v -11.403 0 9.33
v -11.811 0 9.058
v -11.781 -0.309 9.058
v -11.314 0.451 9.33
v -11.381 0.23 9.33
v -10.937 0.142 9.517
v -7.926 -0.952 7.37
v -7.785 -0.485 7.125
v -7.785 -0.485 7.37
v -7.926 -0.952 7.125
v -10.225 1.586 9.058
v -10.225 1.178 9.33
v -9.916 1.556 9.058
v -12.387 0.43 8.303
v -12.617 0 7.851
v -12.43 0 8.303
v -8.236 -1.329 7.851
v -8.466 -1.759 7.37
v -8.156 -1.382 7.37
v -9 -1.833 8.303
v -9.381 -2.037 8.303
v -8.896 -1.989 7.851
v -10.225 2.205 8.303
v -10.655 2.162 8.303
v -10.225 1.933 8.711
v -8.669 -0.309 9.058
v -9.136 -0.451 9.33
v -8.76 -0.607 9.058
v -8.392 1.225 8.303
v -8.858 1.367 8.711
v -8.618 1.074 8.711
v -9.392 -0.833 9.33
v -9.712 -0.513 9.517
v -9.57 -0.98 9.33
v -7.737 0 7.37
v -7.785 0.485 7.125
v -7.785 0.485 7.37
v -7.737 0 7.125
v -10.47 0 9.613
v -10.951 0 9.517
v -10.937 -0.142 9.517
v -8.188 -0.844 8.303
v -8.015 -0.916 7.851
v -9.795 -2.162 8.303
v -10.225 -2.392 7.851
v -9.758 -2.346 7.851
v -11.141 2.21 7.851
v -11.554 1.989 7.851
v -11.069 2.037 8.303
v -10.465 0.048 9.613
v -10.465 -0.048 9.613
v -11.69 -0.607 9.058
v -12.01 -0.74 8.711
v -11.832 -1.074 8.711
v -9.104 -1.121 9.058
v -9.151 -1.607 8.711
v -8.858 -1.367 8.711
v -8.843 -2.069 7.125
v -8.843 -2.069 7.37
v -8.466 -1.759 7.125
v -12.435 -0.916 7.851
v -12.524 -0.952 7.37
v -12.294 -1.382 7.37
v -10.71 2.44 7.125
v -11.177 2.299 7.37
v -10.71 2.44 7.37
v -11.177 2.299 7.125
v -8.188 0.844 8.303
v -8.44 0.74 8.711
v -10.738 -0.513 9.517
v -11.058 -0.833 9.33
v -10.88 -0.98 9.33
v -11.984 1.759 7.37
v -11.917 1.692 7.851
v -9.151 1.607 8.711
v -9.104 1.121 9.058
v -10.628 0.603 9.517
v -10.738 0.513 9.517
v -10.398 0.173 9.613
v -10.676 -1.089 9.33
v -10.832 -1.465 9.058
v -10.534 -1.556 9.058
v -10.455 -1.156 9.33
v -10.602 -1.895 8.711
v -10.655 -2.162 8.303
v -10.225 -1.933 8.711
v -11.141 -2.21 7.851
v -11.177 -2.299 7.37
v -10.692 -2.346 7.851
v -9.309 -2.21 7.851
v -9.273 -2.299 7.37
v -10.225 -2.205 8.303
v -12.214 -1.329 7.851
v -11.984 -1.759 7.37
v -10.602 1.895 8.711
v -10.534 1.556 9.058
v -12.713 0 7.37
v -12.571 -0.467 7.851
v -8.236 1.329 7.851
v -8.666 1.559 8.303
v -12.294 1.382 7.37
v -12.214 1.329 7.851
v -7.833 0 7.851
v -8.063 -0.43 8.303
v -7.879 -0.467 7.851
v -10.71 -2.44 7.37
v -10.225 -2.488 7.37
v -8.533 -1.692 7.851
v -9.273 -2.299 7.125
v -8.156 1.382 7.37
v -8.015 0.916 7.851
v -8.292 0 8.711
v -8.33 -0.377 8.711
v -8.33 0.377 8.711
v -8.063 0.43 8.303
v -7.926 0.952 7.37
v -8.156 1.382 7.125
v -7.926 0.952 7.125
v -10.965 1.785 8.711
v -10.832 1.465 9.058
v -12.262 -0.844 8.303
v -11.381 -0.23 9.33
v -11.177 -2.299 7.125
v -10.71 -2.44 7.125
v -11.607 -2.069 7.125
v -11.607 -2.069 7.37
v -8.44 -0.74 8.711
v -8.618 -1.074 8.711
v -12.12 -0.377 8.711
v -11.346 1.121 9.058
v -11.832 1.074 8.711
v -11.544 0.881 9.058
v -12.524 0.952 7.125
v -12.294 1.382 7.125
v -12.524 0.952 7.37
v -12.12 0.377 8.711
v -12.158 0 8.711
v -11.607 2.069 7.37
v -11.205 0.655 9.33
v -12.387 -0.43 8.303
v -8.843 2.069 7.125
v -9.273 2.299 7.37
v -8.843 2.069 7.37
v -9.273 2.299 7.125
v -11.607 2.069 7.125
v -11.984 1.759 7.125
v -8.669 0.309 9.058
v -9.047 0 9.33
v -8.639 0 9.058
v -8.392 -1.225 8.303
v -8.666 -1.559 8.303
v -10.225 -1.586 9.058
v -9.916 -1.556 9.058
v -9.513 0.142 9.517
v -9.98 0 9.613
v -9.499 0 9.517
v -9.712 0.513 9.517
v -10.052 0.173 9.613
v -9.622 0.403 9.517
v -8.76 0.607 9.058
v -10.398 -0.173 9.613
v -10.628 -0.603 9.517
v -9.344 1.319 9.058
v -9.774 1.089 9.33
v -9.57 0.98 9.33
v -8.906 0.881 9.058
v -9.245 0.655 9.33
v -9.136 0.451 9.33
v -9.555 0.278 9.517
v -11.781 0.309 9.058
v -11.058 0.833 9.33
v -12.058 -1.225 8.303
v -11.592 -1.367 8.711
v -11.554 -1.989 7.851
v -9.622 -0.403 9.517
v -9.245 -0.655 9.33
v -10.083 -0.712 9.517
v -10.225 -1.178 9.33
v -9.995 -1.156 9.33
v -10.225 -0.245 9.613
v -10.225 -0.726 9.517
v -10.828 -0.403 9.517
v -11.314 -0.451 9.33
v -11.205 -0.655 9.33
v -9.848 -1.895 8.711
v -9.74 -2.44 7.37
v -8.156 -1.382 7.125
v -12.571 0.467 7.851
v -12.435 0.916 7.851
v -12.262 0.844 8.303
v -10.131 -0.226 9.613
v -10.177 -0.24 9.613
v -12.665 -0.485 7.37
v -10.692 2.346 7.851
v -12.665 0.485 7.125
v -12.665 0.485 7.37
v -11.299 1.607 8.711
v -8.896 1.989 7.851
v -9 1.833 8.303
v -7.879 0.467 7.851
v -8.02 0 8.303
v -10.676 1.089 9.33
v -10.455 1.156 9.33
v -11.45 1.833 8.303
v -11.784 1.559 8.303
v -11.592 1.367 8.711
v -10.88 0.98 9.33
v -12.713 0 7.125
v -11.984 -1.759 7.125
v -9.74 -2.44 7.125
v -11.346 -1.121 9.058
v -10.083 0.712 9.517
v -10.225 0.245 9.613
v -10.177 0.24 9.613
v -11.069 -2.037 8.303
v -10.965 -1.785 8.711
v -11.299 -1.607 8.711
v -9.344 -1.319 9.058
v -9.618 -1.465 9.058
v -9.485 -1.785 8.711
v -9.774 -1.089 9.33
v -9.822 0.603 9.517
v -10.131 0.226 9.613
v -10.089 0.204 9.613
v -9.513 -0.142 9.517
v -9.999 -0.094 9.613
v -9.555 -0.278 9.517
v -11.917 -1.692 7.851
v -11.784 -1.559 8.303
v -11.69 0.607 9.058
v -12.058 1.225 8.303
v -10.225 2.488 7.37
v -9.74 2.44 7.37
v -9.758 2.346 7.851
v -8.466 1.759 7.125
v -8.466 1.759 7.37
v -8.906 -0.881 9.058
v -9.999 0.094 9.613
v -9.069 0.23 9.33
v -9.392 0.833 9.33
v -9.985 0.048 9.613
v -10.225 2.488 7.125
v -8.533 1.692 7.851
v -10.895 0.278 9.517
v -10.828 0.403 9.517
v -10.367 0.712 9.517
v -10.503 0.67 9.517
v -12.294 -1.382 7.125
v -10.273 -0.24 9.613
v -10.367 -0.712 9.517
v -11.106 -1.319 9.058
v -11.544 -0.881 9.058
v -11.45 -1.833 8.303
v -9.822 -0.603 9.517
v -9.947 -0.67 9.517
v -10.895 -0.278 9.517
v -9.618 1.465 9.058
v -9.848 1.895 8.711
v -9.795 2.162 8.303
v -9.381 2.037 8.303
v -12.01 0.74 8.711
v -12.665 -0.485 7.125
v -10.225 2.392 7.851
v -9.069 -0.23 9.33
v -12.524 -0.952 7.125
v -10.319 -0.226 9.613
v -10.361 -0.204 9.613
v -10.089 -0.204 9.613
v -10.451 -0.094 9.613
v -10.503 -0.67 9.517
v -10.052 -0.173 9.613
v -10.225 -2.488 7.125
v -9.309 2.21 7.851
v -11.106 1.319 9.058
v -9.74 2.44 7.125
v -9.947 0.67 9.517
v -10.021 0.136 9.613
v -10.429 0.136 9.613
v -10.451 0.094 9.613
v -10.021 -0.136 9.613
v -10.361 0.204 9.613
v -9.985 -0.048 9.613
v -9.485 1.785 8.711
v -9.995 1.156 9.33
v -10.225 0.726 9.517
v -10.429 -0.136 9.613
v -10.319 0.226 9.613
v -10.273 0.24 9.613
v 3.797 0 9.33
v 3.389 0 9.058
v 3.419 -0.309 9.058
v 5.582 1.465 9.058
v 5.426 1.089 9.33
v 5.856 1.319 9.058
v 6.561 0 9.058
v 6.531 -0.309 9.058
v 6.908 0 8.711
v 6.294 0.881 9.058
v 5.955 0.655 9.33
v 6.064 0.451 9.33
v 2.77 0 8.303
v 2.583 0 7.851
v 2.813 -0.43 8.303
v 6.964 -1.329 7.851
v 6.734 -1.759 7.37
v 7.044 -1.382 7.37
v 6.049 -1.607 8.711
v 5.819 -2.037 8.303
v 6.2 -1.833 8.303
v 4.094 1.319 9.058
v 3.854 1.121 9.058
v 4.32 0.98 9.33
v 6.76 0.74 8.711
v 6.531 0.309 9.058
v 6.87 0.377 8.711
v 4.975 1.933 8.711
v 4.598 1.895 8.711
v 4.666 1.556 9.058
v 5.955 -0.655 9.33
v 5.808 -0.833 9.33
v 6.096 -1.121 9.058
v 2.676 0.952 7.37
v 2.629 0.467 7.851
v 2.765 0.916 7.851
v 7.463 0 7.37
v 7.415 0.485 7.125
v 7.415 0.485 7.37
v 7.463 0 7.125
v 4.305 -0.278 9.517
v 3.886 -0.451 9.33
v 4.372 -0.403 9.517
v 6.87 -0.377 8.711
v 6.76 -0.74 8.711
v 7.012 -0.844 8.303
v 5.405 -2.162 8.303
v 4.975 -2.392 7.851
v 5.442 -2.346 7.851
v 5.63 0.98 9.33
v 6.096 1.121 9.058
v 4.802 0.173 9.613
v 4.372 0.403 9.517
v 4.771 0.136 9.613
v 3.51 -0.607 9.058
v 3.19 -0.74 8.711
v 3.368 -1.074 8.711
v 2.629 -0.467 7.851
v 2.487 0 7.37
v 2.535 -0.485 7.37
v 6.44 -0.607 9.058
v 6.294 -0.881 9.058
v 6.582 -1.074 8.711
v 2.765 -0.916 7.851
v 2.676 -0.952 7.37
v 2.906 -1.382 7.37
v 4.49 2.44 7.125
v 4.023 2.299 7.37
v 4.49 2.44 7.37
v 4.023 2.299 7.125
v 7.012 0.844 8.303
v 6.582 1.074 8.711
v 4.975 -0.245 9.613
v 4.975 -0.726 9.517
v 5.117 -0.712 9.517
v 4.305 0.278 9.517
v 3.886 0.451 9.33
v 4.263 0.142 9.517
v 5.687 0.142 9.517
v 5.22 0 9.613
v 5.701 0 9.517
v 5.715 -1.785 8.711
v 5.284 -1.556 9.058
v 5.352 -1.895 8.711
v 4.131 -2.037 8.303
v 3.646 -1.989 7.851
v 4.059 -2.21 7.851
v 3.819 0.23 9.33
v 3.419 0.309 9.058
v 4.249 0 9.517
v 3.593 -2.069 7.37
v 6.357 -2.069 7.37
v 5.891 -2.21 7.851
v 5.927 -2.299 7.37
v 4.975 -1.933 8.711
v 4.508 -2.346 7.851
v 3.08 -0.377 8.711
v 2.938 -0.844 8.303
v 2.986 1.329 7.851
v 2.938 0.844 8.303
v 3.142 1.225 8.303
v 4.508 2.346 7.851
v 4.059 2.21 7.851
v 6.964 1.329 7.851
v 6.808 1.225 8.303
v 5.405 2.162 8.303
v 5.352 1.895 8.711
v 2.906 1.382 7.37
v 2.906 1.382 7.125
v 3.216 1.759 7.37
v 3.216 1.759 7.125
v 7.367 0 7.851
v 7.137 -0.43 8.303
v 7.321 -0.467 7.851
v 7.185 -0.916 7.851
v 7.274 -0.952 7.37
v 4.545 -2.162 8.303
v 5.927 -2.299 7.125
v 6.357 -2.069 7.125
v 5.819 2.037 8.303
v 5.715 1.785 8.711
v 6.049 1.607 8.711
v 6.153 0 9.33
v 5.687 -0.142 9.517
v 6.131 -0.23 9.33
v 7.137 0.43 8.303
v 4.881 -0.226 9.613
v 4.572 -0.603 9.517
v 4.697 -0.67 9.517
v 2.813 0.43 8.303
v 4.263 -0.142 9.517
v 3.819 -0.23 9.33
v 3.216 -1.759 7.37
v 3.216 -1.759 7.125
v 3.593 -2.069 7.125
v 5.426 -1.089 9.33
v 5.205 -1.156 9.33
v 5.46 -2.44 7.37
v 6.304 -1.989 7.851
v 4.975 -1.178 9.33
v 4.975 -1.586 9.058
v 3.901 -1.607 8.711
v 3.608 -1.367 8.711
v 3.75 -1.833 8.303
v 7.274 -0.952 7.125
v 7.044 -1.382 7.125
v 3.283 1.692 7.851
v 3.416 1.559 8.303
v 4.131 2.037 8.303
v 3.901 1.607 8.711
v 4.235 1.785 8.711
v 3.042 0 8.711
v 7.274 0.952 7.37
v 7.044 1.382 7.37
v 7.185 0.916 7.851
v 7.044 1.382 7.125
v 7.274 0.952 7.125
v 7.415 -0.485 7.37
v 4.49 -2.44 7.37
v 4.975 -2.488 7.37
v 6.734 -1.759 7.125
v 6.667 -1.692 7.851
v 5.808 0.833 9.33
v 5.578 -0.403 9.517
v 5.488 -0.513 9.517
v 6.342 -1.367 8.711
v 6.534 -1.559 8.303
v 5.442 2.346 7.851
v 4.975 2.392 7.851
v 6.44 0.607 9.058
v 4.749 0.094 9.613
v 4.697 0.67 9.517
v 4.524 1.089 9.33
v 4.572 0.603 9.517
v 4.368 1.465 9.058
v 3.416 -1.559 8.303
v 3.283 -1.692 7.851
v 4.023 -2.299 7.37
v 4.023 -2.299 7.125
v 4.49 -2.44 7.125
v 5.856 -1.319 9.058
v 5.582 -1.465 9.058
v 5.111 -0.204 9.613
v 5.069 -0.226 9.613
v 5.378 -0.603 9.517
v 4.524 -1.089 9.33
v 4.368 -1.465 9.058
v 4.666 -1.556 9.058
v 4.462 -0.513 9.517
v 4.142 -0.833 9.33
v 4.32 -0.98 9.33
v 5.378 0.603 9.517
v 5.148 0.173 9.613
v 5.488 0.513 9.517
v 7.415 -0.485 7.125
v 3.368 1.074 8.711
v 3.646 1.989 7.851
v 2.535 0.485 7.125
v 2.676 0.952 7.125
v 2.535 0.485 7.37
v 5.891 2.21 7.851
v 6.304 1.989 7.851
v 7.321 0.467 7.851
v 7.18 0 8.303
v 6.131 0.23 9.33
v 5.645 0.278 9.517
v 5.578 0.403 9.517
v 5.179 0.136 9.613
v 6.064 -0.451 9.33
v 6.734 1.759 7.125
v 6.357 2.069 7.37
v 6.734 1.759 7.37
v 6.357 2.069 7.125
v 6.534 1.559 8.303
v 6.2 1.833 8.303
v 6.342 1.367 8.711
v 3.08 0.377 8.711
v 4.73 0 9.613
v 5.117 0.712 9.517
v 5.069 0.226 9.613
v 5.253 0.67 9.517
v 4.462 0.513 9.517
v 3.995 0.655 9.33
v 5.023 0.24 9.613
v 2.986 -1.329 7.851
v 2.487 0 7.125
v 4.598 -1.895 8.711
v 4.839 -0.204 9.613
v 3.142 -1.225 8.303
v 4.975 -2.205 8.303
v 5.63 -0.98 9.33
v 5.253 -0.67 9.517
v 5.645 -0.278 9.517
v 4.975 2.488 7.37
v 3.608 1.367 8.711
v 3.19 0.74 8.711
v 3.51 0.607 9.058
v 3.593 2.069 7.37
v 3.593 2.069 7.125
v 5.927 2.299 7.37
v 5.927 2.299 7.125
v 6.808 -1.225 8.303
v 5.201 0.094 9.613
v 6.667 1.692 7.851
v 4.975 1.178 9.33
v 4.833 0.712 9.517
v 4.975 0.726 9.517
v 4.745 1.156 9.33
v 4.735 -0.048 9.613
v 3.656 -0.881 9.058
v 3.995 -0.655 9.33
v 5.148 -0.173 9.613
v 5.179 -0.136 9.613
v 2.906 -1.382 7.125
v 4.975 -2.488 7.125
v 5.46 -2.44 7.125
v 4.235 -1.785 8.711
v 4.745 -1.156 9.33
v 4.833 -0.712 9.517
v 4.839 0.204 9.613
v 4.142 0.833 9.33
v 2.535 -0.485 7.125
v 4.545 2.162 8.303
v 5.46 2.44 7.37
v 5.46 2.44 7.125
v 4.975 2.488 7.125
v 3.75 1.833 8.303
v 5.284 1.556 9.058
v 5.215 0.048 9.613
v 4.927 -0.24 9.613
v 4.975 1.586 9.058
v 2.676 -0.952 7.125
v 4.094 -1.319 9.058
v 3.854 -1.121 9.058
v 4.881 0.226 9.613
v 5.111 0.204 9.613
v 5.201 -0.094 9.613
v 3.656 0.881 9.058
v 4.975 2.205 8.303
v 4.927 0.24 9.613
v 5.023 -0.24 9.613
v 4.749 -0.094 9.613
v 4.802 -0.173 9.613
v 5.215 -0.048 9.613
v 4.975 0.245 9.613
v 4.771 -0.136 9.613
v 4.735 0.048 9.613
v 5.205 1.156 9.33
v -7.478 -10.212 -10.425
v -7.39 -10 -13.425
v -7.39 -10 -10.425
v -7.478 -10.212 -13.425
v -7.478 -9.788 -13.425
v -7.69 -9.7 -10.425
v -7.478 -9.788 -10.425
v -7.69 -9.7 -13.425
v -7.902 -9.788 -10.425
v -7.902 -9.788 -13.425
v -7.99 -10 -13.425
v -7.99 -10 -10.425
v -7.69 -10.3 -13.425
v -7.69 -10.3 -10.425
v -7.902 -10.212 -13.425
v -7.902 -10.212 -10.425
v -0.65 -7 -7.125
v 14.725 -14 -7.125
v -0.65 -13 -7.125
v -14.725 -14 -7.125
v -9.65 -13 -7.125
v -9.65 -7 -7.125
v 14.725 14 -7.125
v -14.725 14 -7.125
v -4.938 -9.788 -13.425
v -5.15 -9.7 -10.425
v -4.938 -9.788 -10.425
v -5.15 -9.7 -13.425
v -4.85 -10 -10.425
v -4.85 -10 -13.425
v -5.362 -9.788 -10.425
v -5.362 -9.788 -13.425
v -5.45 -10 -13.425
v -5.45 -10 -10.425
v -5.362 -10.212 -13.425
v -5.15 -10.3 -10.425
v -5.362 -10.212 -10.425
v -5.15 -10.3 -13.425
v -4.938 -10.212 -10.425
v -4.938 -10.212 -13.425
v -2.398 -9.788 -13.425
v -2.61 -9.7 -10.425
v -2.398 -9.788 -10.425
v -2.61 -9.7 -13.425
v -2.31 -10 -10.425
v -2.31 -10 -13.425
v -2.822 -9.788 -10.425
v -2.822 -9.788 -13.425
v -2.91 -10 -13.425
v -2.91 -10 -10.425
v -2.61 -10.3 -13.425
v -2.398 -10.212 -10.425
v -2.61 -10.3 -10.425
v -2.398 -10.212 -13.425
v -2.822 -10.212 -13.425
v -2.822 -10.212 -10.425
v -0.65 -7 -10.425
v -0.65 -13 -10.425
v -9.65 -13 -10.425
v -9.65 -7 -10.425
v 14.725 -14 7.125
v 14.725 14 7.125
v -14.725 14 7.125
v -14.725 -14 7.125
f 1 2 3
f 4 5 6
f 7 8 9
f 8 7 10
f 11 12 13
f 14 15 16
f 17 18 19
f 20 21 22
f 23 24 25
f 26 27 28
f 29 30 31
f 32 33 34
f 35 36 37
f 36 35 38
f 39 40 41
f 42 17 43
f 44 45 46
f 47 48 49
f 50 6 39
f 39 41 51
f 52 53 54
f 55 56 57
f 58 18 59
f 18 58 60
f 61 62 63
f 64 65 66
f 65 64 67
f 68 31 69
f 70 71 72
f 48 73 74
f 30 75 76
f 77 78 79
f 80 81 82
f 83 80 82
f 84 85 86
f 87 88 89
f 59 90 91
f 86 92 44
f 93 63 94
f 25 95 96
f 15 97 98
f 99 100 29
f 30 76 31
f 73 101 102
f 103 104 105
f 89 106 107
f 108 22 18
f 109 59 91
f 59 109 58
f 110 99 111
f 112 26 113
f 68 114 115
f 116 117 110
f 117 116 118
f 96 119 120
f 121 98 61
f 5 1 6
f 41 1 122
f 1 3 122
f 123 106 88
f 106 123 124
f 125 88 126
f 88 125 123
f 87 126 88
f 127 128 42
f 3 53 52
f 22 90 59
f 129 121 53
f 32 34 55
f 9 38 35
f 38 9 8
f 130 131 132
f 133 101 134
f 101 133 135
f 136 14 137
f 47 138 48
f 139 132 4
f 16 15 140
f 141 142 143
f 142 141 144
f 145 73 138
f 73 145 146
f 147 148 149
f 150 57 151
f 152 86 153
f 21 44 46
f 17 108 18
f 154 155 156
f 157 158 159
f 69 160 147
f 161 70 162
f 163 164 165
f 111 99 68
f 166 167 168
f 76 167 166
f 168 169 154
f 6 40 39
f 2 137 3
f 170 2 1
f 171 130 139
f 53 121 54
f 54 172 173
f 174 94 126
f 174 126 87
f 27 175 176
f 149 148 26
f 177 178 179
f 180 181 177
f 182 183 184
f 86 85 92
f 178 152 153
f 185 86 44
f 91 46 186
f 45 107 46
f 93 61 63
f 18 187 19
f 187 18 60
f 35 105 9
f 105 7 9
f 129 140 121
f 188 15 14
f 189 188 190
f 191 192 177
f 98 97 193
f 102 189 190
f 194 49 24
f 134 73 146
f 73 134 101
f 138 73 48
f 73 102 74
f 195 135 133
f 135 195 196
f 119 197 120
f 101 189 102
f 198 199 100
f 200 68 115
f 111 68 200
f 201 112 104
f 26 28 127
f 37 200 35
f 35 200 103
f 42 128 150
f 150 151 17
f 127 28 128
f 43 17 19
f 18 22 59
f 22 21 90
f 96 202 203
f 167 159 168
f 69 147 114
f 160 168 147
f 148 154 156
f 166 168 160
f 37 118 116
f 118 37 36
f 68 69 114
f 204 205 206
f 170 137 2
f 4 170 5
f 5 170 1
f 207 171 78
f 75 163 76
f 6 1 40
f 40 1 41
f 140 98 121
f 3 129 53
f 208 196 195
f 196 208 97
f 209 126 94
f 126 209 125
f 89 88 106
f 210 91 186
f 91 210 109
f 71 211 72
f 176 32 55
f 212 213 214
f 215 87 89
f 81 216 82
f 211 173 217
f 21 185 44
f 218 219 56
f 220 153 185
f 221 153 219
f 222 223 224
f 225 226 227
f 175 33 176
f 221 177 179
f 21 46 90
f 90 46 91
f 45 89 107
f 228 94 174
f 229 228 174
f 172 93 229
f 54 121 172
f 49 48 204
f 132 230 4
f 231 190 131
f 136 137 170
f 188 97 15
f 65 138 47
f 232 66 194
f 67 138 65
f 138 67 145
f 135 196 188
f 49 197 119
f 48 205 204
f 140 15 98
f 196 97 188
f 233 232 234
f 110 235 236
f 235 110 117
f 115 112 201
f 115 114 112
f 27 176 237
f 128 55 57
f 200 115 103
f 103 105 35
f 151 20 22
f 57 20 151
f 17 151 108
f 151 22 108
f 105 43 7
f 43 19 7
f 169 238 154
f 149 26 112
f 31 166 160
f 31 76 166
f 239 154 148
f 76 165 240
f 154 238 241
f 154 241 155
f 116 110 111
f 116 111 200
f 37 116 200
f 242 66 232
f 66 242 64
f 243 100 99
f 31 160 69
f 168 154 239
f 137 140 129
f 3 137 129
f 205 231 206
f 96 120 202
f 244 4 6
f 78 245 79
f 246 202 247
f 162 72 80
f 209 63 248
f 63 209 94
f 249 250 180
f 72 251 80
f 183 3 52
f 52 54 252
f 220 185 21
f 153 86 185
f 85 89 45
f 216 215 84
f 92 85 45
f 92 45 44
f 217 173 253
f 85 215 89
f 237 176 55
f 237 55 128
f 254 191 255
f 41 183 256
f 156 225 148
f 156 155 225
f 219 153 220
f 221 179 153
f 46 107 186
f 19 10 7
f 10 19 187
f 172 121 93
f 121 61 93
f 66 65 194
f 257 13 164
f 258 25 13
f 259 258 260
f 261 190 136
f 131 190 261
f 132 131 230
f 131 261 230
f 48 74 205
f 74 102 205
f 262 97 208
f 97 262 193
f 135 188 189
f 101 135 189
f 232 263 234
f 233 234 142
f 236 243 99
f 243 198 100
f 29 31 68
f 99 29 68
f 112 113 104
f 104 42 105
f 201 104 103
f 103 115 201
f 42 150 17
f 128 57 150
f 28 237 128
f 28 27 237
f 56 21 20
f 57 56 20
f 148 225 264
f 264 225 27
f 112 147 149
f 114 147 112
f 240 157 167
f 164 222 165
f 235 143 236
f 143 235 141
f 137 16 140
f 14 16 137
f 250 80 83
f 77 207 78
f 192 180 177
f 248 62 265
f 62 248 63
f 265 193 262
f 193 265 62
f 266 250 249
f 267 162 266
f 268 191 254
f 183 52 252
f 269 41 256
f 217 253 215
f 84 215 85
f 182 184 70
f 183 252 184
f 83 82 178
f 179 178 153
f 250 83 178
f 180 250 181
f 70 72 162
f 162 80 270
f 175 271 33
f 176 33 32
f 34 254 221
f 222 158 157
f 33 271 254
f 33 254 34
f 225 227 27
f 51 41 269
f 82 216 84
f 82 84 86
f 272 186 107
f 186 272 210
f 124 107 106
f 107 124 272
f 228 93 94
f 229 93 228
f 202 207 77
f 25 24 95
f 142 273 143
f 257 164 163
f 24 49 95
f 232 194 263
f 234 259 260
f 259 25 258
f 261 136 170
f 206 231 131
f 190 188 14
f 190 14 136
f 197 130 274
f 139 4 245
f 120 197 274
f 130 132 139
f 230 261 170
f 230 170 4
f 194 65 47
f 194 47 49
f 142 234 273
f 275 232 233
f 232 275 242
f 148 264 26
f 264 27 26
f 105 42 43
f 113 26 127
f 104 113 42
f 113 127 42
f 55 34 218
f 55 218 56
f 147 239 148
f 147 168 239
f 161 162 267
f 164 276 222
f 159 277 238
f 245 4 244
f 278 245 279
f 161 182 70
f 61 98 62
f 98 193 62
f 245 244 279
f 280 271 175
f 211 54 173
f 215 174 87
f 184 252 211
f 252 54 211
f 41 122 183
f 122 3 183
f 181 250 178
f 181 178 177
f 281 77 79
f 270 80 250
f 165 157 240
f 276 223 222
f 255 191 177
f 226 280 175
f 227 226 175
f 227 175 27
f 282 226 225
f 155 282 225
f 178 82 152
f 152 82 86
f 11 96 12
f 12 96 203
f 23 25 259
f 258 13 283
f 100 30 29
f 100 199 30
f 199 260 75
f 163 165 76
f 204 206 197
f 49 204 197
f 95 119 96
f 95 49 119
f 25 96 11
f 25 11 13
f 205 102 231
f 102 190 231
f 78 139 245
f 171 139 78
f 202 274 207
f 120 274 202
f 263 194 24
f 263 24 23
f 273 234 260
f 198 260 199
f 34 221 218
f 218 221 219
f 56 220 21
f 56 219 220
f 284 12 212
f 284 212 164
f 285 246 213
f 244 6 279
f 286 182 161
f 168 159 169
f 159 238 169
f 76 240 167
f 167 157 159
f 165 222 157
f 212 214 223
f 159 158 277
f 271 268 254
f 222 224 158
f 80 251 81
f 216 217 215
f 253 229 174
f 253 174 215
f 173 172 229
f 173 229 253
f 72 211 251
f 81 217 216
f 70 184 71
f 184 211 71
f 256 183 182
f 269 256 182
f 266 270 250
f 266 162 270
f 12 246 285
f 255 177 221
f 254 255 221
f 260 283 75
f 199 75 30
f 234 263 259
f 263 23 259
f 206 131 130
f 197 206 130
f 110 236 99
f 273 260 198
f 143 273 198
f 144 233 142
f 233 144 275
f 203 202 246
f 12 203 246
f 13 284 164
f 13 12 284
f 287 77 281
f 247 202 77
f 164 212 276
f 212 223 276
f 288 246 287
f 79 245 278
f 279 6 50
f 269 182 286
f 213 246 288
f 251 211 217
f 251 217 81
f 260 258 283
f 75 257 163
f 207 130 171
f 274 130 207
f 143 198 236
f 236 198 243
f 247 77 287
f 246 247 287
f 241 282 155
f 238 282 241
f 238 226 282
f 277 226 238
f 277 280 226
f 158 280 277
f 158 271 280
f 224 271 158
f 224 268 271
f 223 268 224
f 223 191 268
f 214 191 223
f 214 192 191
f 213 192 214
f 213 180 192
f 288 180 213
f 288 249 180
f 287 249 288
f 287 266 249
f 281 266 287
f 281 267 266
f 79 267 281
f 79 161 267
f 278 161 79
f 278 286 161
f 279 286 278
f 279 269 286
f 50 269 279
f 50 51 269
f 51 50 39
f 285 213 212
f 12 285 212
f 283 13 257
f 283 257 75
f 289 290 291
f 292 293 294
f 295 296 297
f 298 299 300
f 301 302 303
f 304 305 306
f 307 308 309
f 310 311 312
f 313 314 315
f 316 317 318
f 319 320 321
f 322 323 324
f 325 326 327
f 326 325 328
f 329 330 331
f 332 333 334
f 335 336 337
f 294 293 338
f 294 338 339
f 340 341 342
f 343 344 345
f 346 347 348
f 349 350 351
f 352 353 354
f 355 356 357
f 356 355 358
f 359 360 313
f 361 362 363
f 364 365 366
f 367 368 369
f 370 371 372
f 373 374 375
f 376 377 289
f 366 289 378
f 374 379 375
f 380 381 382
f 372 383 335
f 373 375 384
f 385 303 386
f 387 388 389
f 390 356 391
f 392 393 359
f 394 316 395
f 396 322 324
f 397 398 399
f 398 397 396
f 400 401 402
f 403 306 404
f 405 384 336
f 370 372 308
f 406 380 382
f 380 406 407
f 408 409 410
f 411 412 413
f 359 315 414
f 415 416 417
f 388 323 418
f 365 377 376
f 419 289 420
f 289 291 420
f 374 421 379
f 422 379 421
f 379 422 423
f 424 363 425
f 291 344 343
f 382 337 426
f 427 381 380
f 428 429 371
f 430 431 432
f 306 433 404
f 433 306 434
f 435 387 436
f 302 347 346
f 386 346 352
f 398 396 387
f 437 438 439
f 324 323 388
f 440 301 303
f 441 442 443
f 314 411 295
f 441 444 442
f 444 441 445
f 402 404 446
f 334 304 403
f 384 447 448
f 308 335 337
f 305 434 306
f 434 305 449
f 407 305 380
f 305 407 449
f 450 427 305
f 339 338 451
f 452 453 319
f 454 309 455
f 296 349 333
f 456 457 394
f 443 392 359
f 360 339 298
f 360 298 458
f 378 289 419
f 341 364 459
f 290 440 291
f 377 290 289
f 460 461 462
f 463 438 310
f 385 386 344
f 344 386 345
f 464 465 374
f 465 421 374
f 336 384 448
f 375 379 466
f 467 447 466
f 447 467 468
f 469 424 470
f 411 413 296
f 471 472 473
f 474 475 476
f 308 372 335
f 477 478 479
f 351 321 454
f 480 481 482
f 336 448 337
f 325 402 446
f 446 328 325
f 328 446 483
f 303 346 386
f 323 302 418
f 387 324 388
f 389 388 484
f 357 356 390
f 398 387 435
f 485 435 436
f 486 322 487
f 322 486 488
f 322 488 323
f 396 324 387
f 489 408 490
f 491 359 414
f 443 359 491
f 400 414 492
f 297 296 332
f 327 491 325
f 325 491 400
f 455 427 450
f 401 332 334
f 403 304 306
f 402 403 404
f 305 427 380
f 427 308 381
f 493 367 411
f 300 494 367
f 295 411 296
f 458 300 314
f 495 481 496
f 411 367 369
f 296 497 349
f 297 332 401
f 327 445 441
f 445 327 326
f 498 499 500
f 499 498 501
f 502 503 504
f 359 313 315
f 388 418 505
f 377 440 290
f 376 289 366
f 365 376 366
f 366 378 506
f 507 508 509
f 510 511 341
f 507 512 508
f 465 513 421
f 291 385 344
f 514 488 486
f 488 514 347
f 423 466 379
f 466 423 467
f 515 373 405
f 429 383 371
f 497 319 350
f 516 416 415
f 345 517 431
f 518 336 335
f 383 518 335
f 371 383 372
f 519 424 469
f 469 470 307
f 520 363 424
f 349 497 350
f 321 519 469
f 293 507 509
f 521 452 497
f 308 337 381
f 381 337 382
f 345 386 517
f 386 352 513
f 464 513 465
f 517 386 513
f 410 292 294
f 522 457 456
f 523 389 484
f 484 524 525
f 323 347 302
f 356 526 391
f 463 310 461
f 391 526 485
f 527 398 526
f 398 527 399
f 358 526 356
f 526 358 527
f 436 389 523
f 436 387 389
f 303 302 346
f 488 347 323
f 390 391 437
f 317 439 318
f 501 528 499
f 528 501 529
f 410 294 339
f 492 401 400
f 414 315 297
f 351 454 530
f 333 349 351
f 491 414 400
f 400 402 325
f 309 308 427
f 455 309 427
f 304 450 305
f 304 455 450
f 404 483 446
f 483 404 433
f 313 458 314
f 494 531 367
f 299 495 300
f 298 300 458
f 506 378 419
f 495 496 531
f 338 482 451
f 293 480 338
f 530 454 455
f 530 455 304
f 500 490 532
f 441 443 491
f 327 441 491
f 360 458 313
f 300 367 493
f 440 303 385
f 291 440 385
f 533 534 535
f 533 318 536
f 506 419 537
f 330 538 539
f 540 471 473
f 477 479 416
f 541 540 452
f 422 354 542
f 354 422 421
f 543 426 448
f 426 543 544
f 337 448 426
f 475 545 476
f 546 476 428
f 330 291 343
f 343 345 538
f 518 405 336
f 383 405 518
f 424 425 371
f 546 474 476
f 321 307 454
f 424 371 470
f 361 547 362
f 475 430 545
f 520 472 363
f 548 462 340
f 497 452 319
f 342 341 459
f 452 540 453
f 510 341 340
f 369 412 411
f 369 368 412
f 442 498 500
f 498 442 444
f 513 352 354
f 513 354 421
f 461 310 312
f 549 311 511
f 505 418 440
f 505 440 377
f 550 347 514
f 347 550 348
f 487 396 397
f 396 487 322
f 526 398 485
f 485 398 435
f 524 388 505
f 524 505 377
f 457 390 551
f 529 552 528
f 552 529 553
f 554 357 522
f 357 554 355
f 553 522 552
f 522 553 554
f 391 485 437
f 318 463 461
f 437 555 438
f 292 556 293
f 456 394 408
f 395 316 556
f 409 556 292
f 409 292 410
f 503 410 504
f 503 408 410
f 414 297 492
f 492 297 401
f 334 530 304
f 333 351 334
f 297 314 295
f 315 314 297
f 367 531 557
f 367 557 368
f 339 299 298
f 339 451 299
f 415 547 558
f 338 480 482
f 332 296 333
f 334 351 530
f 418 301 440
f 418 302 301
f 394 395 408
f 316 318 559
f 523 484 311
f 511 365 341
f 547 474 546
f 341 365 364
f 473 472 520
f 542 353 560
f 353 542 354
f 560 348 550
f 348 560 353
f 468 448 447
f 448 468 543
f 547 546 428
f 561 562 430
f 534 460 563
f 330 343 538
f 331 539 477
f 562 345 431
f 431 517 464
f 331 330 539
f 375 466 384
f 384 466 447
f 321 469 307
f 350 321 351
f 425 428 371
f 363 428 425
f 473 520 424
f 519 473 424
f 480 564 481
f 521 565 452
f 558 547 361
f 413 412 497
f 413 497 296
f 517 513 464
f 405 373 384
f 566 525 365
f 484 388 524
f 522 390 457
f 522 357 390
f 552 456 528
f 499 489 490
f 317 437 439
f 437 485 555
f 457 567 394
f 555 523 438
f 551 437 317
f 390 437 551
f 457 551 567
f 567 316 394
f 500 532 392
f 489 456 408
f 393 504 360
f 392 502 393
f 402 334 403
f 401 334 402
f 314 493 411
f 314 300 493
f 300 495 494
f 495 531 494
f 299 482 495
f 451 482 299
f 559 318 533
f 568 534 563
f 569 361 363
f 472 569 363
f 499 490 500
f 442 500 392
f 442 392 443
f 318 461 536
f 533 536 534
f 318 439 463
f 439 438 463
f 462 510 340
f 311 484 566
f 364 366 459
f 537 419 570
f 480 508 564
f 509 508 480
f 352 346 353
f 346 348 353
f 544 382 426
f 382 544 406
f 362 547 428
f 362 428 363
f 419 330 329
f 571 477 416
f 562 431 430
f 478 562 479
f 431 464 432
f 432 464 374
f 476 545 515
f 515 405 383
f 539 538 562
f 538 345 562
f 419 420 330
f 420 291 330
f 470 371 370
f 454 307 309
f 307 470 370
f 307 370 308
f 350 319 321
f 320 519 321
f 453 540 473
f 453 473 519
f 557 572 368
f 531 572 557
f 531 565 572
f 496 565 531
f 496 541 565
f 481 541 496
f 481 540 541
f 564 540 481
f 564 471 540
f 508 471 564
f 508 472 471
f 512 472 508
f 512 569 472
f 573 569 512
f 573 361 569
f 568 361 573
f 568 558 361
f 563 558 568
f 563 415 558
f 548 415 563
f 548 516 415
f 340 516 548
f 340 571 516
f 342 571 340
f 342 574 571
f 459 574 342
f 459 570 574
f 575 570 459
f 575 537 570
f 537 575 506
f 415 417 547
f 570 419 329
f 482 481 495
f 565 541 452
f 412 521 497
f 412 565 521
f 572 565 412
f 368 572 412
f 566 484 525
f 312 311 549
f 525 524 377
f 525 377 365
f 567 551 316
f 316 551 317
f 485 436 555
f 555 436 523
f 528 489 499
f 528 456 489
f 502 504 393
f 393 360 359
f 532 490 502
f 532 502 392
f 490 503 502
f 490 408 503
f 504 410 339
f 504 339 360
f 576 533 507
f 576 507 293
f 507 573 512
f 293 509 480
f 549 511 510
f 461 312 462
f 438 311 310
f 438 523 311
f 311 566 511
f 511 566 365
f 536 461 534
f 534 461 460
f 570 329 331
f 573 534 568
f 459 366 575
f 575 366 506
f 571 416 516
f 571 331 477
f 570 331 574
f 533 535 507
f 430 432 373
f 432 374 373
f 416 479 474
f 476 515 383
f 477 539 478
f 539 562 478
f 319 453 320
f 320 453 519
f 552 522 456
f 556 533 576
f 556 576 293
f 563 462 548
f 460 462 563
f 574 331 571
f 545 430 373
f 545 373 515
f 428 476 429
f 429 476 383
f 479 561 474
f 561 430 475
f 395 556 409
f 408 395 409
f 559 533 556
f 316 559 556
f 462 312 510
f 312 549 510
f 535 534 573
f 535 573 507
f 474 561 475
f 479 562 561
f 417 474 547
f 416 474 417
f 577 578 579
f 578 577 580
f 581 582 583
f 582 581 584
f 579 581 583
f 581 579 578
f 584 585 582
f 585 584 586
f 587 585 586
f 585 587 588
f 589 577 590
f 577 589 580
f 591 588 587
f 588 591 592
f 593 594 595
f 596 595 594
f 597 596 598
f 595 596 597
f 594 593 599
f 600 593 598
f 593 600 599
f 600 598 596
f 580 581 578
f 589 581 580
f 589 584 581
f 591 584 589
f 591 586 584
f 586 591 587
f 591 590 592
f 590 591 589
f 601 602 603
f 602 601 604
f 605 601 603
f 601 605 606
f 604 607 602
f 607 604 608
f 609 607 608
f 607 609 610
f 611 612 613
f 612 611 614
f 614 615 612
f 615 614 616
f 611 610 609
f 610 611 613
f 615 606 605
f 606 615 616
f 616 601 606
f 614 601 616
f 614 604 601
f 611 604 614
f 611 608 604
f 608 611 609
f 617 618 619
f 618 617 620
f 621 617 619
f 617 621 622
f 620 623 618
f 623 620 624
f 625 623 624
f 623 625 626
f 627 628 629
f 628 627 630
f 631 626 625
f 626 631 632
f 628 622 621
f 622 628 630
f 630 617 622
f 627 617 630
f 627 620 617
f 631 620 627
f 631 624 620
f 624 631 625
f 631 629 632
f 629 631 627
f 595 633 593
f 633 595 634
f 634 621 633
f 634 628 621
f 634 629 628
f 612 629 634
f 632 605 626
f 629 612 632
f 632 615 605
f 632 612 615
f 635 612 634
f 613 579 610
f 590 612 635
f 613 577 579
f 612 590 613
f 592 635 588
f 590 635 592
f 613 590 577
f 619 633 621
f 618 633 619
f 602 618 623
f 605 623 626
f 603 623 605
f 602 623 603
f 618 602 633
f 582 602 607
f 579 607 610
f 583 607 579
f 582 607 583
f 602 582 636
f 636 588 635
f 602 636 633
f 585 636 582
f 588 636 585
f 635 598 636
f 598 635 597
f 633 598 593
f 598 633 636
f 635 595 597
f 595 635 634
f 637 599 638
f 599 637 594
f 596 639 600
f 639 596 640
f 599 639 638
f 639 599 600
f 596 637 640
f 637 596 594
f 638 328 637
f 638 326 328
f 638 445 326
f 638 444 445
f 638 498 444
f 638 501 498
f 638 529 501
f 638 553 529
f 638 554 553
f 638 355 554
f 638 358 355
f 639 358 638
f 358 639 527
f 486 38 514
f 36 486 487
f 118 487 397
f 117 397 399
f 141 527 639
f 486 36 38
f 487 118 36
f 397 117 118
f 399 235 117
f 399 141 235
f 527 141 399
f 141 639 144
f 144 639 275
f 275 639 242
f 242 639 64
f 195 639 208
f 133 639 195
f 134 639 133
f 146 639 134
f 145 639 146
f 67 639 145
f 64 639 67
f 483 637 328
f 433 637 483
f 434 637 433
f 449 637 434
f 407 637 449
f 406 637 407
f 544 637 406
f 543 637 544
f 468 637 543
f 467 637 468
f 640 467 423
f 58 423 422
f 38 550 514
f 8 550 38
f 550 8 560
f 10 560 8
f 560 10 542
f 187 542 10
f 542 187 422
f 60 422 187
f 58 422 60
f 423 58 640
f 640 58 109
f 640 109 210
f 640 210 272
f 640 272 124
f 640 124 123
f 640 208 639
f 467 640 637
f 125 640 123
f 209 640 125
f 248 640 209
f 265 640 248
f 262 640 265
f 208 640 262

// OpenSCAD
// Sharp GP2Y0D413K0F Distance Sensor
// Unit: mm
// Origin: center of main body
// -Z: mounting face (PWB/connector side)

// -------------------------------------------------------
// Key dimensions from datasheet
// -------------------------------------------------------
// Overall body (main case)
body_w   = 29.45;  // X width (left-right in front view)
body_d   = 13.5;   // Y depth (front-back, from bottom view: 7.5+4.15+16.3 total=28 but case is ~13.5)
body_h   = 13.05;  // Z height of main body (top of lens case reference)

// Re-reading: bottom view shows depth 7.5+4.15+16.3 = 27.95 ≈ 28mm total board depth
// Side view shows body height 8.4mm (case), with total 13.05 to top of lens
// Let's use:
//   board depth (Y): 28mm
//   main case height (Z, above PWB): 8.4mm
//   lens protrusion above case: 13.05 - 8.4 = 4.65mm (lens case)
//   PWB thickness: 1.2mm
//   connector below PWB: 3.3mm (reference)

total_depth  = 28.0;    // Y total (board)
case_h       = 8.4;     // main case height above PWB top surface
pwb_t        = 1.2;     // PWB thickness
conn_h       = 3.3;     // connector protrusion below PWB (reference)
lens_case_h  = 13.05;   // top of lens case from top of PWB (= case_h + lens dome portion)

// total Z height = pwb_t + case_h + (lens_case_h - case_h) = pwb_t + lens_case_h
total_h = pwb_t + lens_case_h; // = 1.2 + 13.05 = 14.25mm

// Origin: center of body, -Z = bottom of PWB (mounting face)
// So Z=0 is at center of total height
// Z range: -total_h/2 to +total_h/2  but mounting face at -Z
// Let's place: PWB bottom at z = -total_h/2
// PWB top    at z = -total_h/2 + pwb_t
// Case top   at z = -total_h/2 + pwb_t + case_h
// Lens top   at z = +total_h/2

z_bottom = -total_h / 2;   // PWB bottom (mounting face)
z_pwb_top = z_bottom + pwb_t;
z_case_top = z_pwb_top + case_h;
z_lens_top = z_pwb_top + lens_case_h; // = total_h/2

// Lens positions (from left edge, X direction)
// Left edge of body at x = -body_w/2
lens_emitter_x = -body_w/2 + 4.5;   // *4.5 from left
lens_detector_x = -body_w/2 + 19.7; // *19.7 from left

// Lens diameters (estimated from drawing, ~5mm each)
lens_r = 2.5;
lens_dome_h = lens_case_h - case_h; // protrusion above case = 4.65mm

// Lens case width (the raised portion for lenses)
// From drawing: lens case is 7.1mm wide centered around lenses, 6.3mm inset
lens_case_w = 7.1;  // width of lens case protrusion
lens_case_x_center = (lens_emitter_x + lens_detector_x) / 2;

// Side connector tab dimensions (side view shows stepped bottom)
// Inner step: 10.1mm wide, 3.75mm high from bottom of body
step_w = 10.1;
step_h = 3.75; // step height from bottom of main body face

// bottom view connector area: centered at x around connector region
// Connector (bottom view): 7.5 from left edge, 4.15 wide
conn_x_offset = -body_w/2 + 7.5 + 4.15/2;
conn_w = 4.15;
conn_d = 8.0; // approx connector depth

// Colors
case_color   = [0.15, 0.15, 0.15, 1.0]; // dark ABS
pwb_color    = [0.6,  0.5,  0.2,  1.0]; // paper phenol (yellowish)
lens_color   = [0.1,  0.1,  0.1,  0.7]; // dark lens (IR cut)
conn_color   = [0.8,  0.8,  0.8,  1.0]; // connector pins

// -------------------------------------------------------
// Modules
// -------------------------------------------------------

module pwb() {
    color(pwb_color)
    translate([0, 0, z_bottom + pwb_t/2])
        cube([body_w, total_depth, pwb_t], center=true);
}

module main_case() {
    color(case_color)
    translate([0, 0, z_pwb_top + case_h/2])
        cube([body_w, total_depth, case_h], center=true);
}

module lens_case_block() {
    // Raised lens housing on top of main case
    // From side view: lens case (6.3) inset from right, 7.1 wide
    // The lens case sits on top of main case, roughly centered on lens positions
    h = lens_case_h - case_h;
    // Full width of top raised section across top of sensor
    // Looking at drawing: the raised lens section spans across body width
    // Let's model it as spanning full width but with lens windows
    color(case_color)
    translate([0, 0, z_case_top + h/2])
        cube([body_w, total_depth, h], center=true);
}

module emitter_lens() {
    // Cylindrical lens with dome
    color(lens_color, 0.8)
    translate([lens_emitter_x, 0, z_case_top]) {
        cylinder(h=lens_dome_h, r=lens_r, center=false, $fn=32);
        translate([0, 0, lens_dome_h])
            sphere(r=lens_r, $fn=32);
    }
}

module detector_lens() {
    color(lens_color, 0.8)
    translate([lens_detector_x, 0, z_case_top]) {
        cylinder(h=lens_dome_h, r=lens_r, center=false, $fn=32);
        translate([0, 0, lens_dome_h])
            sphere(r=lens_r, $fn=32);
    }
}

module connector() {
    // 3-pin connector below PWB
    // From datasheet: 12001W90-3P-HF connector
    // Protruding below PWB 3.3mm (reference), 3 pins
    conn_body_w = 9.0;
    conn_body_d = 6.0;
    conn_body_h = conn_h;
    
    color([0.2, 0.2, 0.2, 1])
    translate([conn_x_offset, 
               -total_depth/2 + conn_body_d/2 + 1.0,
               z_bottom - conn_body_h/2])
        cube([conn_body_w, conn_body_d, conn_body_h], center=true);
    
    // Pins (3 pins, 2.54mm pitch)
    pin_pitch = 2.54;
    pin_h = conn_body_h + 3.0;
    pin_r = 0.3;
    for (i = [-1, 0, 1]) {
        color(conn_color)
        translate([conn_x_offset + i * pin_pitch,
                   -total_depth/2 + conn_body_d/2 + 1.0,
                   z_bottom - pin_h/2])
            cylinder(h=pin_h, r=pin_r, center=true, $fn=8);
    }
}

module bottom_step() {
    // The step/notch visible in side view at bottom of case (3.75mm)
    // This represents the lower ridge/tab on the sides
    step_d   = 2.5;   // depth of tab
    tab_h    = 3.75;  // height
    tab_w    = body_w - step_w; // side tabs

    color(case_color)
    // Left tab
    translate([-body_w/2 + (body_w - step_w)/4,
               0,
               z_pwb_top + tab_h/2])
        cube([(body_w - step_w)/2, total_depth, tab_h], center=true);
    // Right tab  
    translate([body_w/2 - (body_w - step_w)/4,
               0,
               z_pwb_top + tab_h/2])
        cube([(body_w - step_w)/2, total_depth, tab_h], center=true);
}

// -------------------------------------------------------
// Assembly
// -------------------------------------------------------

pwb();
main_case();
lens_case_block();
emitter_lens();
detector_lens();
connector();
// bottom_step();  // uncomment if side tabs needed

// -------------------------------------------------------
// Debug: show origin
// -------------------------------------------------------
// color("red") sphere(0.5, $fn=8);
